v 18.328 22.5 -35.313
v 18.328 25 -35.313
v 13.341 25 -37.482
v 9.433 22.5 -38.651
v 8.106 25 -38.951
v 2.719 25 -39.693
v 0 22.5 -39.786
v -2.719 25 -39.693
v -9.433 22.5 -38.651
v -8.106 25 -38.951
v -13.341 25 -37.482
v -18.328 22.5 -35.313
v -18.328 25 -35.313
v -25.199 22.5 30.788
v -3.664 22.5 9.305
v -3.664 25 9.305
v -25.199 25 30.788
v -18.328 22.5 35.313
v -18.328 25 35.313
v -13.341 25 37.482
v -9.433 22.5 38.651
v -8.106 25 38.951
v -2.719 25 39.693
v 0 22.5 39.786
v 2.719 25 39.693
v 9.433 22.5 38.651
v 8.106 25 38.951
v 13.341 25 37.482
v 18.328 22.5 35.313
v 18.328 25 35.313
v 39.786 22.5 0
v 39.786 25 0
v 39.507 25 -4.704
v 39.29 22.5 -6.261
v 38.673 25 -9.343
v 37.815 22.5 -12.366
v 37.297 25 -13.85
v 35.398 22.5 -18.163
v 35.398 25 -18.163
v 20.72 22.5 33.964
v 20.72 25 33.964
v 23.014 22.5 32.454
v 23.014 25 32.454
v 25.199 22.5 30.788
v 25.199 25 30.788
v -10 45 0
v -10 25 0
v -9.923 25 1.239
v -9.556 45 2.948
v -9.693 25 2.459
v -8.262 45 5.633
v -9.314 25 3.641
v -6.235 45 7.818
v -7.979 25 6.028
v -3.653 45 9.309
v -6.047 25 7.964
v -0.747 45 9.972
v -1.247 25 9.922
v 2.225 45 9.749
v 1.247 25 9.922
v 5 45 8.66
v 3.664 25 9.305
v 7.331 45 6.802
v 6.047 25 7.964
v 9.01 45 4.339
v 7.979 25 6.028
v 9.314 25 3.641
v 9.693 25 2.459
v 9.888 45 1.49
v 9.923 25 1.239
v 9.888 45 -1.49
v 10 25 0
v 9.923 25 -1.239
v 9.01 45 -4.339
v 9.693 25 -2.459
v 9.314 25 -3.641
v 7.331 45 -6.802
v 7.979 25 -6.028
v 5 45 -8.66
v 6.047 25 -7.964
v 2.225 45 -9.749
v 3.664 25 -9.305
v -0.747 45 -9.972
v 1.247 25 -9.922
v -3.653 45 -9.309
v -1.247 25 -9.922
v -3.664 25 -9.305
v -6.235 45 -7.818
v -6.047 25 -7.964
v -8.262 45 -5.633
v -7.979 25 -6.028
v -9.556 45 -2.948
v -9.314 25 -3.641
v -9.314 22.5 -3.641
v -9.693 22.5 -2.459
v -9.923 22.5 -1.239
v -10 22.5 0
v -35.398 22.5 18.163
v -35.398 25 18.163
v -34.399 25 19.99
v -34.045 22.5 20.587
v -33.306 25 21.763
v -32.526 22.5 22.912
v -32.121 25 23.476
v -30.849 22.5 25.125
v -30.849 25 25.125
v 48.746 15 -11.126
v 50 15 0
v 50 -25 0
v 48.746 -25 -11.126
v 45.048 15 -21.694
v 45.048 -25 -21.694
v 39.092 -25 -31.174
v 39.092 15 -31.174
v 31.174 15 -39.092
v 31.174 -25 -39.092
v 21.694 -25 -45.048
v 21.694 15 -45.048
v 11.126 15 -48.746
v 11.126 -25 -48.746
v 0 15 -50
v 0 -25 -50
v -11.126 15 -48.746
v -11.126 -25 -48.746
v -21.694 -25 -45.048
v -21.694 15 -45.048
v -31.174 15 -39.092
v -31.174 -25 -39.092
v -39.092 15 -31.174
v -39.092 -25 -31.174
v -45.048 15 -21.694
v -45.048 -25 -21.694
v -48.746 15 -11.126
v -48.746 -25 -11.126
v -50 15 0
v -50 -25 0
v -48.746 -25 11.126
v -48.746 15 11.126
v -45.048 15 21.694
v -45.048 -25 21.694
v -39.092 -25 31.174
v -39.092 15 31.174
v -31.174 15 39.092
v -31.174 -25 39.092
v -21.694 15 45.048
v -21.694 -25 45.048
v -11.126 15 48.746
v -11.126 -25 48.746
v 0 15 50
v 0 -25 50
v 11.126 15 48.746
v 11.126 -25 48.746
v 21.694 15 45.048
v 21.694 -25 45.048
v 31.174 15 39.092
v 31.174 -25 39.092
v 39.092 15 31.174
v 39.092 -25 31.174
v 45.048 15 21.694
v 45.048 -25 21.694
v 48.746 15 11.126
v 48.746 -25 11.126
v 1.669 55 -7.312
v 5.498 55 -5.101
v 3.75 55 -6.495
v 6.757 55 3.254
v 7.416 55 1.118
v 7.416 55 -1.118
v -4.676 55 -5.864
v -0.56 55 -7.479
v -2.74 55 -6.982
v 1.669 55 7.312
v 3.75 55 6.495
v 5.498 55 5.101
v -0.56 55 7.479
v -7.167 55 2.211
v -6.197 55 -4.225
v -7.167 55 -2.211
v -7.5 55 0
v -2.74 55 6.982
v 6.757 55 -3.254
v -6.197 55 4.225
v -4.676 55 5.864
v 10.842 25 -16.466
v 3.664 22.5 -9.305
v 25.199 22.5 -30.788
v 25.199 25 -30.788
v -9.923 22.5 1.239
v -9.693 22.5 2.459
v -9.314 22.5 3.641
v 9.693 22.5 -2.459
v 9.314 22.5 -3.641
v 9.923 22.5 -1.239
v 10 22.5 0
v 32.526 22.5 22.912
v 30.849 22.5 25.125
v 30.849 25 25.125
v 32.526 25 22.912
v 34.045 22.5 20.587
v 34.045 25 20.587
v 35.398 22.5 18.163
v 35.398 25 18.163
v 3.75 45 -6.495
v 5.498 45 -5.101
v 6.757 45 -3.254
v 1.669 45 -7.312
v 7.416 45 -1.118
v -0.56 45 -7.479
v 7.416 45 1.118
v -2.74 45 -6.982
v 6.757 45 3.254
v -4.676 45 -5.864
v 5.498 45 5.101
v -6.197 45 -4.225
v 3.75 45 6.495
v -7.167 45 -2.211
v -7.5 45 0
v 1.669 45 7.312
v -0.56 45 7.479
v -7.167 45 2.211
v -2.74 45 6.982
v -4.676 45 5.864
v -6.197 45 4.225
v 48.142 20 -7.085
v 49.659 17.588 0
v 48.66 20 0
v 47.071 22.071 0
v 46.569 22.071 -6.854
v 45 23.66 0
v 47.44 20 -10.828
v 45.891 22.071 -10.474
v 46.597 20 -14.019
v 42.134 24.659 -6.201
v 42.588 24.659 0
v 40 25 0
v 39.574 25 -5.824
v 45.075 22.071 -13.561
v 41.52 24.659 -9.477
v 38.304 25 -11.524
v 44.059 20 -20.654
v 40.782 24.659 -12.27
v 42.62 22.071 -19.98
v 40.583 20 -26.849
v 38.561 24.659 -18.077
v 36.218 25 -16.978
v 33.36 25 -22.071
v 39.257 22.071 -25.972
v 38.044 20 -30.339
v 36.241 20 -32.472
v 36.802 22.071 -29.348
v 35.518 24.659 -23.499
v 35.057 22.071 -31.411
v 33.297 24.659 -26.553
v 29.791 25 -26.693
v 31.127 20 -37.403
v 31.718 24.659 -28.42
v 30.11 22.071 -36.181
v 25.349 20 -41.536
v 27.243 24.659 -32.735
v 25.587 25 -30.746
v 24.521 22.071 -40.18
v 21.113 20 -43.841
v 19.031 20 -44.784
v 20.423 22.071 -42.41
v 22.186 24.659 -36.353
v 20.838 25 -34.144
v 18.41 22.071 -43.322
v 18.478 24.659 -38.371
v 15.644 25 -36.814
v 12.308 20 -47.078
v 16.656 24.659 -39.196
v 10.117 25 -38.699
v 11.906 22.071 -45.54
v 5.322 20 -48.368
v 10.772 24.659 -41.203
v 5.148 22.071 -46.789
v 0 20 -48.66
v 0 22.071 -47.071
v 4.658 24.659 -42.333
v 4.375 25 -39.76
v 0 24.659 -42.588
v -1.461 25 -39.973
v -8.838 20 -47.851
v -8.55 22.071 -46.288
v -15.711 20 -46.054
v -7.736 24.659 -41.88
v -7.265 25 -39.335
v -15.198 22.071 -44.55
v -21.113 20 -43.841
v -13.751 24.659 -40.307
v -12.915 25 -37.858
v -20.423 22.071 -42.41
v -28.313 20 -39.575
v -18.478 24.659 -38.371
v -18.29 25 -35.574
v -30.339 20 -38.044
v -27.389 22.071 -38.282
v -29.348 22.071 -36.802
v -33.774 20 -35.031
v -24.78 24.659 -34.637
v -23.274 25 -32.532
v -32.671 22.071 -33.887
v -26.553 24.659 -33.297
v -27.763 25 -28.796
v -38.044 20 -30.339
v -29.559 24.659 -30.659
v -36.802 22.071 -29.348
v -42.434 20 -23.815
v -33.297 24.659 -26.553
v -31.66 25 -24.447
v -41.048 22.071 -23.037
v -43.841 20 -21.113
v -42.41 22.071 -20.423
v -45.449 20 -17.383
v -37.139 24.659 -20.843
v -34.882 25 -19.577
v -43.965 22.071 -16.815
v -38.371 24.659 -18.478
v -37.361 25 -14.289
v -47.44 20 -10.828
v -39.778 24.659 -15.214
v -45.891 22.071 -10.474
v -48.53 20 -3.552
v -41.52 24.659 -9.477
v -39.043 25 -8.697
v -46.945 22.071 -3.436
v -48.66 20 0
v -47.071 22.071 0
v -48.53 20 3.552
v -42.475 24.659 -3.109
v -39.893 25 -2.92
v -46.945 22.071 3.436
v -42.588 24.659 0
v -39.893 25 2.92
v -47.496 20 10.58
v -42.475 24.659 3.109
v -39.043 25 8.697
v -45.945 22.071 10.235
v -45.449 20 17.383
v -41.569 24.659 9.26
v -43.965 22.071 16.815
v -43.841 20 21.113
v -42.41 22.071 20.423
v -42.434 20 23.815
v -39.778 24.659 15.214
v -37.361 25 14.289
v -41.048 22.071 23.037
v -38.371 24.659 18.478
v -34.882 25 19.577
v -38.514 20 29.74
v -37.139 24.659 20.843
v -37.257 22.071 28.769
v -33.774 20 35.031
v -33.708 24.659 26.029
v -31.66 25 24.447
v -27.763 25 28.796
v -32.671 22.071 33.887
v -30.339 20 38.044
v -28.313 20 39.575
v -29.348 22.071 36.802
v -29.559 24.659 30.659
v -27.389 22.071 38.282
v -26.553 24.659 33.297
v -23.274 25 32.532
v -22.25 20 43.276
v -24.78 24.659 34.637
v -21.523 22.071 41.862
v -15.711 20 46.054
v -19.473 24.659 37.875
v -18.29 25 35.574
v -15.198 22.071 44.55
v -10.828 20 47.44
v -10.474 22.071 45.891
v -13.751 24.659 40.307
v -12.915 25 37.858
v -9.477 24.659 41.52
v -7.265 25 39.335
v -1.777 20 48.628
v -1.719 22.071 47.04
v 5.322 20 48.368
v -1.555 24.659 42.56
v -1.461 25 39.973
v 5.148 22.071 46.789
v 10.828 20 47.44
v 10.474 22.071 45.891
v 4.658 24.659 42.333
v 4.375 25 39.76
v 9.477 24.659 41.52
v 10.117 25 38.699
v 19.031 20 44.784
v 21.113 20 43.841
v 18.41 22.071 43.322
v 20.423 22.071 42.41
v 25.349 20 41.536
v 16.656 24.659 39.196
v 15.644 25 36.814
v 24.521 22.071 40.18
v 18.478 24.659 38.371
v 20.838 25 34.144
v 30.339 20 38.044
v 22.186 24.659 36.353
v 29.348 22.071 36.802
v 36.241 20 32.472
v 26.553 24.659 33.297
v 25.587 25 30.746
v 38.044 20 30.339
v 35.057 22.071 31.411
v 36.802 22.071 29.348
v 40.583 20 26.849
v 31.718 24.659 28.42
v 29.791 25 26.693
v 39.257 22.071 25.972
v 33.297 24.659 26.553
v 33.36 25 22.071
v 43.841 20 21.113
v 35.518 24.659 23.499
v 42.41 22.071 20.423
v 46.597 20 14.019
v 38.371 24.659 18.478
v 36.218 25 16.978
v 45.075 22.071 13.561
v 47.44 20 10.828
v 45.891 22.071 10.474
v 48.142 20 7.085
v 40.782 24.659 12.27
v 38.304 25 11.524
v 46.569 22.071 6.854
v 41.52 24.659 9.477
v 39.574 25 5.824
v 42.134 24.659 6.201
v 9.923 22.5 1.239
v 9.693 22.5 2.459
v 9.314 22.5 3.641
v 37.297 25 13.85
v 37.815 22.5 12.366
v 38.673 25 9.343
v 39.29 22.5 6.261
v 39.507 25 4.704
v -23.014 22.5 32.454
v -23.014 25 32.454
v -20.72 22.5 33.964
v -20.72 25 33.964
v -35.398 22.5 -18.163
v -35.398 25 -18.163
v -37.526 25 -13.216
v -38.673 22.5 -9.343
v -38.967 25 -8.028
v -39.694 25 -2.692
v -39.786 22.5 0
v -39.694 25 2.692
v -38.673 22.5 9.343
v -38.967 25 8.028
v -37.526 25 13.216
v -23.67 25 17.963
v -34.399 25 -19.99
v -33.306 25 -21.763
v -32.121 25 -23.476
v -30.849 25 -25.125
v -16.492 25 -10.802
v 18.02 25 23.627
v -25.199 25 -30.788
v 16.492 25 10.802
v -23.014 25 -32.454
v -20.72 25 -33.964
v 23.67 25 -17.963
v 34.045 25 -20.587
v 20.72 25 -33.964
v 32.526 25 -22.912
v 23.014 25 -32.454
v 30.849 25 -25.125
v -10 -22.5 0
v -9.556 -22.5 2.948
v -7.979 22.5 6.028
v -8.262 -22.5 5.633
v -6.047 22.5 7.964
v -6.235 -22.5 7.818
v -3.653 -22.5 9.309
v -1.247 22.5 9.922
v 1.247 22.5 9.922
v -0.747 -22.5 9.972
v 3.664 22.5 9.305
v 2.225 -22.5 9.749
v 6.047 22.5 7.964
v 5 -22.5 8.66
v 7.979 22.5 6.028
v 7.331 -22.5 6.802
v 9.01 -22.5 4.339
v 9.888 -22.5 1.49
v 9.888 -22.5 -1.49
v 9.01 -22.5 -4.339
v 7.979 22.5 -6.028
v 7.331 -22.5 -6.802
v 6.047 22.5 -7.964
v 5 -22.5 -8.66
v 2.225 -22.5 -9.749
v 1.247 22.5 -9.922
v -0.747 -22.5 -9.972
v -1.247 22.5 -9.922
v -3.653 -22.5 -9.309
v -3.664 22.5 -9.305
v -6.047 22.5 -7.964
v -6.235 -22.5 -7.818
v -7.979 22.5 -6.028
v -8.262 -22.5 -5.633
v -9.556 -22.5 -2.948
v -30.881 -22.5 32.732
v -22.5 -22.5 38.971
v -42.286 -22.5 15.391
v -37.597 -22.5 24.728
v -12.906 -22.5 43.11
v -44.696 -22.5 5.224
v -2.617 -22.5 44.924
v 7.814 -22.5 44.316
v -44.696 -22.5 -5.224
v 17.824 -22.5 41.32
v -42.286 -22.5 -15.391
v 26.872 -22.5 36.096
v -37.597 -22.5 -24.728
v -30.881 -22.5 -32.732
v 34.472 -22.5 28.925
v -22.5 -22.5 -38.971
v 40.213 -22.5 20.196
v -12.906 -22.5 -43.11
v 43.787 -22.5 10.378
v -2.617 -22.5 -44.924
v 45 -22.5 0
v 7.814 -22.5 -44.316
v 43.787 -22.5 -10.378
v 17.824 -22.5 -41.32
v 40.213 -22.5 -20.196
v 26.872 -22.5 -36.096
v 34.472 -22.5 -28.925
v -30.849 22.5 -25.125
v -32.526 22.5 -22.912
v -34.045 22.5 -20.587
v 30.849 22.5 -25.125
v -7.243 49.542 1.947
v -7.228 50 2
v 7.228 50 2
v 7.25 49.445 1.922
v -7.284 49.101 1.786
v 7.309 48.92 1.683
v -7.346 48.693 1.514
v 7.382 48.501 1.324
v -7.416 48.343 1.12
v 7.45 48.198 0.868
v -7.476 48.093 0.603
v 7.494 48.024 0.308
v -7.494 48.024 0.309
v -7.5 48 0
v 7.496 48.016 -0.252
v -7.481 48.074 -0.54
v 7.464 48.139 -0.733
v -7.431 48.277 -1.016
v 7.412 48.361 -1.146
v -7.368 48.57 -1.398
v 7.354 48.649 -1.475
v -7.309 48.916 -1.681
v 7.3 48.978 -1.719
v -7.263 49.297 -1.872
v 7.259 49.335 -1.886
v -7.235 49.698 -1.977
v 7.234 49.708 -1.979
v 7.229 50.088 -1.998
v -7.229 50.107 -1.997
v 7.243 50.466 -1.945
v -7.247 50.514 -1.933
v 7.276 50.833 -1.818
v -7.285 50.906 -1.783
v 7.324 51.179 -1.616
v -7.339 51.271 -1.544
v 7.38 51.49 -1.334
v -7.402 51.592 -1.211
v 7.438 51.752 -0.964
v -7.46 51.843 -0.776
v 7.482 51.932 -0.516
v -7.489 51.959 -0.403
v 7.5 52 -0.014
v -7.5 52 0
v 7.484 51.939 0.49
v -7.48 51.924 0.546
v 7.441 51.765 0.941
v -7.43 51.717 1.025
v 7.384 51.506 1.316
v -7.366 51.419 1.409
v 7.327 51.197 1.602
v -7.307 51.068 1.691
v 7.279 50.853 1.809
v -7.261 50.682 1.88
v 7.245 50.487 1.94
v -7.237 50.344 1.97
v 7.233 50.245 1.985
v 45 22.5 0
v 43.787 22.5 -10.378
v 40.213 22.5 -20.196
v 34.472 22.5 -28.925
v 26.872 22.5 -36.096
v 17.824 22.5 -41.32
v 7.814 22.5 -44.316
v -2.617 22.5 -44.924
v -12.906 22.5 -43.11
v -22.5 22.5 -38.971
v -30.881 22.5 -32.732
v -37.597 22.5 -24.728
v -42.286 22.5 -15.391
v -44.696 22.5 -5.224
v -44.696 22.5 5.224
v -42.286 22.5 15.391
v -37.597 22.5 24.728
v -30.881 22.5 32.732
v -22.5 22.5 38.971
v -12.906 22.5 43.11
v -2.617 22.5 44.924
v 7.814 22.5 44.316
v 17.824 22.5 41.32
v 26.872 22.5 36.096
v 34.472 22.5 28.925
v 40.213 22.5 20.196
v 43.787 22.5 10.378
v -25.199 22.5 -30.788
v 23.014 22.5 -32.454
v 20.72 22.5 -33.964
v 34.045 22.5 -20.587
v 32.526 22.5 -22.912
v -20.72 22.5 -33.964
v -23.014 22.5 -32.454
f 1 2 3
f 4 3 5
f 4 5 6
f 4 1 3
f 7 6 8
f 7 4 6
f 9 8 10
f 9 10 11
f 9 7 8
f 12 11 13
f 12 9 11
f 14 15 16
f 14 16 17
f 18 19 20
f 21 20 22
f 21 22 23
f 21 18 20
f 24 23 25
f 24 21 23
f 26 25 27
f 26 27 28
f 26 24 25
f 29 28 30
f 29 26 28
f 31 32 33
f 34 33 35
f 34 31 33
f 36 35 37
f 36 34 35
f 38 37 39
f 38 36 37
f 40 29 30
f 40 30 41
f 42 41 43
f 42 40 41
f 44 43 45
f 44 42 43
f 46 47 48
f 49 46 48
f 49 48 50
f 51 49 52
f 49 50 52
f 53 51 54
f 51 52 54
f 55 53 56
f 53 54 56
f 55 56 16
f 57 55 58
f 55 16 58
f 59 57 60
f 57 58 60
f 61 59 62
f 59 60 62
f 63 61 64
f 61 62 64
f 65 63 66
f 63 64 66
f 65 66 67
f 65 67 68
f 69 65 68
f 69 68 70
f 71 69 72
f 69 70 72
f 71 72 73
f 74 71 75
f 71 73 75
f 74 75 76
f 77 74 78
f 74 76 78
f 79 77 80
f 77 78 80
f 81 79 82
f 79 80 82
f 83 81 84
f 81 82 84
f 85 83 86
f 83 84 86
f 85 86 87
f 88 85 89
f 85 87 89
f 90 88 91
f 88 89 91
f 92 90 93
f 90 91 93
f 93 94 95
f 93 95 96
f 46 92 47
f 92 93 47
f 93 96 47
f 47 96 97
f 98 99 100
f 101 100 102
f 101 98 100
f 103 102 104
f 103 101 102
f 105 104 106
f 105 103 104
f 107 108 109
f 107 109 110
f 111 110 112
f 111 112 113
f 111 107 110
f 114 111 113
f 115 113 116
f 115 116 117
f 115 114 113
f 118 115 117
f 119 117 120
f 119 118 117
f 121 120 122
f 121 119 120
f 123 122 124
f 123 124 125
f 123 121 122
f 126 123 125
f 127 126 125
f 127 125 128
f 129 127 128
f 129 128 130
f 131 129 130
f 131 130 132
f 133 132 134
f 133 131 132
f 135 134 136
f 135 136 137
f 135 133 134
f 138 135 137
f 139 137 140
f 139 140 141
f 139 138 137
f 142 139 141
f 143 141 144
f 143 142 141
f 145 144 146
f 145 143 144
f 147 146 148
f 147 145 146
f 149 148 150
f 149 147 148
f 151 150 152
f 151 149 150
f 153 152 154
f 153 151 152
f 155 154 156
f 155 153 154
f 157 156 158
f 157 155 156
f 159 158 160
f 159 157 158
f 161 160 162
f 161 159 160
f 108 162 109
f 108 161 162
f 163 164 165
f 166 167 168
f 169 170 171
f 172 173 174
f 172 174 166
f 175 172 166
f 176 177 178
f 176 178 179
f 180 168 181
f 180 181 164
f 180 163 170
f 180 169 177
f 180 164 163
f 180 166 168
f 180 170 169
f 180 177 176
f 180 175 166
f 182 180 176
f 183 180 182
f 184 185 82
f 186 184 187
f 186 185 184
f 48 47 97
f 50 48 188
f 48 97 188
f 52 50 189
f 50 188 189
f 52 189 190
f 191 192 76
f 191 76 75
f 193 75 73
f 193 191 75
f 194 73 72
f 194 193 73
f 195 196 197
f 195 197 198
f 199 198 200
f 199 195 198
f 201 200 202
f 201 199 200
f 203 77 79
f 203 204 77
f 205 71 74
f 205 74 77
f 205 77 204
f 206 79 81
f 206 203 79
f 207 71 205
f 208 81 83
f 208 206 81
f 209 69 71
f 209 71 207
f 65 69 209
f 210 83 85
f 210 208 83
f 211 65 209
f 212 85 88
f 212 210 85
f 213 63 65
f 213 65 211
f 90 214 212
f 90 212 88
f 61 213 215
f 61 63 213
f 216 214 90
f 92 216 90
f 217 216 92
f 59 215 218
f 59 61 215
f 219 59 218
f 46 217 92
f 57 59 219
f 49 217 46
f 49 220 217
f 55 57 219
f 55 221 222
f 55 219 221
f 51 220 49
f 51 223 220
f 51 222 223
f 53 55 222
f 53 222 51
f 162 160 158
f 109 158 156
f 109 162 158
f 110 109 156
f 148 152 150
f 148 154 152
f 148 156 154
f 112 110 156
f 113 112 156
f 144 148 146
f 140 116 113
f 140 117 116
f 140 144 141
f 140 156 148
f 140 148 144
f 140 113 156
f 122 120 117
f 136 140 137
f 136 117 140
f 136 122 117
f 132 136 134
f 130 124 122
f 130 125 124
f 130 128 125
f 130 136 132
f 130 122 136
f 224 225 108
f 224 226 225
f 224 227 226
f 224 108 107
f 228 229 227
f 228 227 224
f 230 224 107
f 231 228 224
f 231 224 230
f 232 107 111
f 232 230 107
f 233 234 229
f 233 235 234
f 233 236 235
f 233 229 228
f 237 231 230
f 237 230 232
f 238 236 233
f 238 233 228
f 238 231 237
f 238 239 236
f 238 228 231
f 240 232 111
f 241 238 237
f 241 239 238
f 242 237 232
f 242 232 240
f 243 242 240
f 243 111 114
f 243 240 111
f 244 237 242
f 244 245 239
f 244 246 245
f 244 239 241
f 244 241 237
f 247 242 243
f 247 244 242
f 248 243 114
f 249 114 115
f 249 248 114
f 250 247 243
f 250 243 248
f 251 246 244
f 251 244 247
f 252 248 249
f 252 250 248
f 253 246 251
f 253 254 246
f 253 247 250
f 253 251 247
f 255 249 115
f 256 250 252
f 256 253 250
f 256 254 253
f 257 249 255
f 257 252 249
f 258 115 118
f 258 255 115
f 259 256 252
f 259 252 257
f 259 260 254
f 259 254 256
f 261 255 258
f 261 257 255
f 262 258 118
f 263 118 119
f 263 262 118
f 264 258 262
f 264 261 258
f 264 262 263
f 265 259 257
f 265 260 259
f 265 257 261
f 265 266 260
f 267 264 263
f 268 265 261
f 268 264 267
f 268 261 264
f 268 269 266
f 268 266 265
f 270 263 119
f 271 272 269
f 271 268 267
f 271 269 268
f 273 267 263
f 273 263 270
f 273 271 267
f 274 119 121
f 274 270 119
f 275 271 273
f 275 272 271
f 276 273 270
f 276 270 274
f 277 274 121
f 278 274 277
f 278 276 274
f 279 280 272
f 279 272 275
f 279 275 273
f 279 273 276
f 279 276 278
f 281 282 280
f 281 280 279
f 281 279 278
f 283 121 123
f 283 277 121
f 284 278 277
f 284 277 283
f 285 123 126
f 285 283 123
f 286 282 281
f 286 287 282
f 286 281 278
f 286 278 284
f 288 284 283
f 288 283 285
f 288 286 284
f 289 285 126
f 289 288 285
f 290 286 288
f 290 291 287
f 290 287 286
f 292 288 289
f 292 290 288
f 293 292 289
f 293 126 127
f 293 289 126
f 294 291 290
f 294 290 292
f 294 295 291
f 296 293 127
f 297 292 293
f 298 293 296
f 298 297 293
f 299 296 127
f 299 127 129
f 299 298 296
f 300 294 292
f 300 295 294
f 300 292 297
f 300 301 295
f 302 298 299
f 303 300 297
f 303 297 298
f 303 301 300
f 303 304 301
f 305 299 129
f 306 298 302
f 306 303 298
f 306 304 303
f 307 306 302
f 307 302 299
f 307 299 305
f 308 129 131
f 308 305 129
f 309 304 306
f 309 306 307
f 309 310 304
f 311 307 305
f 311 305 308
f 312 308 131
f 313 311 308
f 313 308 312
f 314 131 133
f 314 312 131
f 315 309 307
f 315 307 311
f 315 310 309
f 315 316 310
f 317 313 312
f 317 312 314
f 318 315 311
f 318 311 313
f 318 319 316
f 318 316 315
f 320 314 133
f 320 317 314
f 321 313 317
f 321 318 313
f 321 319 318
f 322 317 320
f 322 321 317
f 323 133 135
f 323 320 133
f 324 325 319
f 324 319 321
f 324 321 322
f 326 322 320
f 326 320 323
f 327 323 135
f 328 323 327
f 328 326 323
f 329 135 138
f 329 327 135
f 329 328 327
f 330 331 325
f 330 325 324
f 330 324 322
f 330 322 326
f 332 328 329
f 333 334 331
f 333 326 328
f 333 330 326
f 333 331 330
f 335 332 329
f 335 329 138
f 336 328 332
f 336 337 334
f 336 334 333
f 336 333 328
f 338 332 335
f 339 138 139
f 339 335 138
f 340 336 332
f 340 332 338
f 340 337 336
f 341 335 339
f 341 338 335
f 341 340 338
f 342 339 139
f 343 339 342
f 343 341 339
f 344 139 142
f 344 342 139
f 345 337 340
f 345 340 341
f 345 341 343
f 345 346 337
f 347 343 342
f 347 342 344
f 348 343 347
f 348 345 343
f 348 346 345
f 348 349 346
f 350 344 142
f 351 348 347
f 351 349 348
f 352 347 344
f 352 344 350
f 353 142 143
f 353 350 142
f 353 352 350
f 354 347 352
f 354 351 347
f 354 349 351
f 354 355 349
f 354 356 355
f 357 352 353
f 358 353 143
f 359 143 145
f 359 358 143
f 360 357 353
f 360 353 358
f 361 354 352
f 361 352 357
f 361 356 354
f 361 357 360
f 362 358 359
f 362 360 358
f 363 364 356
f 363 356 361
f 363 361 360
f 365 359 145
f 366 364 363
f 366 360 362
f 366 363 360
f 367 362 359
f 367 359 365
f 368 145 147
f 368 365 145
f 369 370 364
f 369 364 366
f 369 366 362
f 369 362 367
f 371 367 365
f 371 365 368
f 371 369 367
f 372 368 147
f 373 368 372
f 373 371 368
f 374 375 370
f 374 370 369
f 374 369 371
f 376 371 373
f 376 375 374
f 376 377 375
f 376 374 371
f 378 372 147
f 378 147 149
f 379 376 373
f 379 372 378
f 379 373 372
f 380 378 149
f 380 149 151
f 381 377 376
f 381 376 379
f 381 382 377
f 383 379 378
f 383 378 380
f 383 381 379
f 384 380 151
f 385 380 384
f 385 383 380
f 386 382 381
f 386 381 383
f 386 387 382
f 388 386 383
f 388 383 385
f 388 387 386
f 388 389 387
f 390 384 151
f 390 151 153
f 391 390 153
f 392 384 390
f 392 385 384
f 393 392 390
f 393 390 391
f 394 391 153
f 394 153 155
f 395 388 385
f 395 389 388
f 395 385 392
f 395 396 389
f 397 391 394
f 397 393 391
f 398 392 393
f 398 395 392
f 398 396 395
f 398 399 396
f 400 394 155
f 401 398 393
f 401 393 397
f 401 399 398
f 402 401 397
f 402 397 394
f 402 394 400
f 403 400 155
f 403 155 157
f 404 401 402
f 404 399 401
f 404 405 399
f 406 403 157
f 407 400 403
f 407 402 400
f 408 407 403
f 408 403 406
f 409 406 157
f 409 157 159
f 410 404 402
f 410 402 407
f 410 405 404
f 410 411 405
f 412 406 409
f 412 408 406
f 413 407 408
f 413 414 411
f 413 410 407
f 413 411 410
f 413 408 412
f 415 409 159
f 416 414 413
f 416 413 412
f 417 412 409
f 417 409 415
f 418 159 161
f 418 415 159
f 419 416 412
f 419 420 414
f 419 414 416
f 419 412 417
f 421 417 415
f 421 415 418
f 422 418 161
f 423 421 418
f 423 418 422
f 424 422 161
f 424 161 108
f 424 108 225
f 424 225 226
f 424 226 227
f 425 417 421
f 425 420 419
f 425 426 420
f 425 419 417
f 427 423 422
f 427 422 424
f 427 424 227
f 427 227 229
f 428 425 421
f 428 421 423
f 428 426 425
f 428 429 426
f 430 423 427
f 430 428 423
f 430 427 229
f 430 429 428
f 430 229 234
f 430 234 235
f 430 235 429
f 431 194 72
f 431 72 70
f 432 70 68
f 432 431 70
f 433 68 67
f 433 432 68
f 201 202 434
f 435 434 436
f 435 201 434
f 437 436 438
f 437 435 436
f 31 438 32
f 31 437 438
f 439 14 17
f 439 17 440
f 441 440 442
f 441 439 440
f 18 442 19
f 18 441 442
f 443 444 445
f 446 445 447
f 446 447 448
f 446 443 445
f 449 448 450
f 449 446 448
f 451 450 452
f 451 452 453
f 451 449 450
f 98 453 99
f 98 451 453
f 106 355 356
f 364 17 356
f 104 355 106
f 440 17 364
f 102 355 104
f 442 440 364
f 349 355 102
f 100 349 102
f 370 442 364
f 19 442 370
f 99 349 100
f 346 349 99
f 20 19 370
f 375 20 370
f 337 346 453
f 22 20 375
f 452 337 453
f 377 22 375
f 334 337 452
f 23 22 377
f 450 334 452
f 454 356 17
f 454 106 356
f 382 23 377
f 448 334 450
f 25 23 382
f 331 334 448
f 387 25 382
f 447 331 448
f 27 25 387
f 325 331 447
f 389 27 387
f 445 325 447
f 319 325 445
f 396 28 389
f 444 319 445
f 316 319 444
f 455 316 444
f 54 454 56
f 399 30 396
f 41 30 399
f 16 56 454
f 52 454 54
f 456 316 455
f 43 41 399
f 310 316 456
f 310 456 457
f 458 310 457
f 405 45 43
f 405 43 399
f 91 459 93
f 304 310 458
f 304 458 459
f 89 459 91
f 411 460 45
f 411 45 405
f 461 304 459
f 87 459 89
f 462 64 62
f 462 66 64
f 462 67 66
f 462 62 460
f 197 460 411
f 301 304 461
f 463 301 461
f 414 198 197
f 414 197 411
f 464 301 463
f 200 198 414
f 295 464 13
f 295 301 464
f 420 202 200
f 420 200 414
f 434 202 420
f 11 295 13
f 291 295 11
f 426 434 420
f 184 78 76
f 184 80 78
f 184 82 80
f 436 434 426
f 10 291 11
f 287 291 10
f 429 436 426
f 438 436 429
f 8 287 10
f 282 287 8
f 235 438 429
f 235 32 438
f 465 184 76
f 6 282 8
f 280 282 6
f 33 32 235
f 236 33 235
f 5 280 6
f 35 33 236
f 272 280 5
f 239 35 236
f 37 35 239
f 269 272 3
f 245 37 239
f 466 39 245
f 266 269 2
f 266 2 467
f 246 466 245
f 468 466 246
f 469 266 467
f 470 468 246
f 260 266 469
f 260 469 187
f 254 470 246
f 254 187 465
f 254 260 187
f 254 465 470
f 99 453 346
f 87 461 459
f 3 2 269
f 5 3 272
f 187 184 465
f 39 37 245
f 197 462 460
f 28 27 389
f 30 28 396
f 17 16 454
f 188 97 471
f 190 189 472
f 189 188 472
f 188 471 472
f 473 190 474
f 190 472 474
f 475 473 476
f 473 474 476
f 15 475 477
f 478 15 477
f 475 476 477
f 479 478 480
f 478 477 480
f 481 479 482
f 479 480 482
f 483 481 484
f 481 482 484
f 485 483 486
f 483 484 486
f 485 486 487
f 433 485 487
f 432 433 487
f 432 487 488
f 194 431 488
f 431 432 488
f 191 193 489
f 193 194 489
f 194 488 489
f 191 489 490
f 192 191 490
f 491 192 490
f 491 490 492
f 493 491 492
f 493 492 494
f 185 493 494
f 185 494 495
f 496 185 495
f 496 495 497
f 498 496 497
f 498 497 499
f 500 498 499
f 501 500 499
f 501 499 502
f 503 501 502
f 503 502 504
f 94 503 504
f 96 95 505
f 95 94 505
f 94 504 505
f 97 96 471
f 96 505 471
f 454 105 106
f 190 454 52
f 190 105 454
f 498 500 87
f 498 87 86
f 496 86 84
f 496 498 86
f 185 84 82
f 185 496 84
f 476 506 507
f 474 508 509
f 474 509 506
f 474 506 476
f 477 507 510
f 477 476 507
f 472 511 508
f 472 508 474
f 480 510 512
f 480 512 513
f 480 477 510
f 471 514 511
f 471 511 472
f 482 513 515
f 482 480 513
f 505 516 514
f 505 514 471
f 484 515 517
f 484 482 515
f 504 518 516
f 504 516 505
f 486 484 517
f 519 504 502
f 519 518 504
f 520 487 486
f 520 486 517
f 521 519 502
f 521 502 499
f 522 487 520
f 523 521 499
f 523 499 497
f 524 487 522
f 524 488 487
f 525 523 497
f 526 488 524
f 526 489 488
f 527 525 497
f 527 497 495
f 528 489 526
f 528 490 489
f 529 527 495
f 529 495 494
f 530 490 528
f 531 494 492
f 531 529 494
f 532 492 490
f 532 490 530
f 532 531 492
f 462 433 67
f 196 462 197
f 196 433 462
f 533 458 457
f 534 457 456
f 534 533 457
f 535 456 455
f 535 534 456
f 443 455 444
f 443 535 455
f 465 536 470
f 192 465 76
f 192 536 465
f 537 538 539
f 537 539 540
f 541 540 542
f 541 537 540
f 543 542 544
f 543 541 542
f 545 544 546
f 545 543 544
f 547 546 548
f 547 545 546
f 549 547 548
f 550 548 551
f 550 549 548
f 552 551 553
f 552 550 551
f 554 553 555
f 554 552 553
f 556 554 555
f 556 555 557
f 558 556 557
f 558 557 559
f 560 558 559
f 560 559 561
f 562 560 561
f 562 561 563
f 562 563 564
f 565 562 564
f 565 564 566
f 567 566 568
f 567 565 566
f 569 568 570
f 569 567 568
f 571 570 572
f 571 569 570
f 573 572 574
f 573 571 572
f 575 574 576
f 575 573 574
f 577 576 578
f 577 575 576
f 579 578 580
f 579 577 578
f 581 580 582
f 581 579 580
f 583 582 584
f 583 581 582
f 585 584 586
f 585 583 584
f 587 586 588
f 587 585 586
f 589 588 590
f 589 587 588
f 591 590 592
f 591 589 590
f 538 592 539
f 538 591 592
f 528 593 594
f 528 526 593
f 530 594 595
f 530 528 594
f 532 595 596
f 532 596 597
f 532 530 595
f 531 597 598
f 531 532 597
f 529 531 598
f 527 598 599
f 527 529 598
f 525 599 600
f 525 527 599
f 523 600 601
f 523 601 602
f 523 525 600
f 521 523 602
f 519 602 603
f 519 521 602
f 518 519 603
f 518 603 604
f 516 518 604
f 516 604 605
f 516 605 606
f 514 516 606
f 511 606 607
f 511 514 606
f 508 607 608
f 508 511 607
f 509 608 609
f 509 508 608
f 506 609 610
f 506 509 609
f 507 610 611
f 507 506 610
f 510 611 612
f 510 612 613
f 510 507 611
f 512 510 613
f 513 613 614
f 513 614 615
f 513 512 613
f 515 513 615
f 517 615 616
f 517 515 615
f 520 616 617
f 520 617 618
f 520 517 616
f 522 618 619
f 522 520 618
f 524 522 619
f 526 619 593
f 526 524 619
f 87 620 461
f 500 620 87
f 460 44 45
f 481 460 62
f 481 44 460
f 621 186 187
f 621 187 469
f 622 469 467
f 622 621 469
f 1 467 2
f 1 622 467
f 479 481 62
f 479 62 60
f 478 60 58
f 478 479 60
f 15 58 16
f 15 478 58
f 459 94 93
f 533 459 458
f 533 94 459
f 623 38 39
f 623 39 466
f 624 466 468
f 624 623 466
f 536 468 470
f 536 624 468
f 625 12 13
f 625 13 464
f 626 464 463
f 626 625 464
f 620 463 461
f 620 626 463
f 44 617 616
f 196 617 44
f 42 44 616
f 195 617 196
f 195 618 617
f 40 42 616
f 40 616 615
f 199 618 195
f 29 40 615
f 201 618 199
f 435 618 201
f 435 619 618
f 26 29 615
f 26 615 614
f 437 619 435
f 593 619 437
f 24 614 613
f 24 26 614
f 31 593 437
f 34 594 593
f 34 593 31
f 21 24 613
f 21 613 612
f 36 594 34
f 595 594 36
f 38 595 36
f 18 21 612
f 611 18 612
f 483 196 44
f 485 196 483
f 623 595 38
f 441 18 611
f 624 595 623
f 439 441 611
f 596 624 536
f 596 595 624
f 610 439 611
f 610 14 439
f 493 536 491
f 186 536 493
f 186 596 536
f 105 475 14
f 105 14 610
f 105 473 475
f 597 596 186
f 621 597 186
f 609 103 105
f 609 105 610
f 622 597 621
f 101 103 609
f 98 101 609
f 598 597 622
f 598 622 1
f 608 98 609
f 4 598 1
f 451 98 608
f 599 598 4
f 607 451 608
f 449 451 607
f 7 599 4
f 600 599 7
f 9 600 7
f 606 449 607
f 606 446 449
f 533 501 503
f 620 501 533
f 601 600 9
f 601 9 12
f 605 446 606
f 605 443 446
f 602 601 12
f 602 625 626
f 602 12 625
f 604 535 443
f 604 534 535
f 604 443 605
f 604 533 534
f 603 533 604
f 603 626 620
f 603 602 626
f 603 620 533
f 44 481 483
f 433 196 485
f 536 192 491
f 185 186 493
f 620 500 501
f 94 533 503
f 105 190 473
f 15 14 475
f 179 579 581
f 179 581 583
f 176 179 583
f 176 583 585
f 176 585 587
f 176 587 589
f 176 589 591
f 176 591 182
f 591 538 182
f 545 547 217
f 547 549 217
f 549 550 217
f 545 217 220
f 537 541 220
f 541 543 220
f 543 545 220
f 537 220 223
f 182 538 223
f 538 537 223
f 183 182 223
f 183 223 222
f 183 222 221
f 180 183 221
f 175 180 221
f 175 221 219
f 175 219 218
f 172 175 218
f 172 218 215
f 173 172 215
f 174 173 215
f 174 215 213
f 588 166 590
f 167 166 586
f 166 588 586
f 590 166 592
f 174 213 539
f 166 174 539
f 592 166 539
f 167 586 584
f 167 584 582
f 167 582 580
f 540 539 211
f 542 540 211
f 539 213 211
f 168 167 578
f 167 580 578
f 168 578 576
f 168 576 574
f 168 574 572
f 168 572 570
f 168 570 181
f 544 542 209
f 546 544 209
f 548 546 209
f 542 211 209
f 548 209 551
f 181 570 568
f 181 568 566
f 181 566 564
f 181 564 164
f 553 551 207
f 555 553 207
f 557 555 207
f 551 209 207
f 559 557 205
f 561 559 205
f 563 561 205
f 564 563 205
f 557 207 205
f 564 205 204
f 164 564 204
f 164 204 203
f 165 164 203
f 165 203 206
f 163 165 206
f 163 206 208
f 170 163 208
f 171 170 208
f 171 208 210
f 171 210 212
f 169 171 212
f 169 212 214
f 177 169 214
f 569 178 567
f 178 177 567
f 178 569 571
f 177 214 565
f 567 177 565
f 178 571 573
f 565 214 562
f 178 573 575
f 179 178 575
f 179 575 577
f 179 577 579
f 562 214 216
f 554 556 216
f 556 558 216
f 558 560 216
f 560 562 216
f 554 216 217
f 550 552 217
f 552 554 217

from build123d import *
from build123d.topology import SkipClean

# Parameters (mm, degrees)
SKETCH2_R               = 10
BOSS_EXTRUDE1_DEPTH     = 30
CUT_EXTRUDE1_START      = -10
SKETCH3_R               = 10
SKETCH3_R_2             = 7.5
CUT_EXTRUDE1_DEPTH      = 10
CUT_EXTRUDE3_DEPTH      = 10
CUT_EXTRUDE3_DEPTH_BACK = 10
SKETCH5_R               = 2
CUT_EXTRUDE4_START      = -10
CUT_EXTRUDE4_DEPTH      = 10
FILLET2_R               = 10
BOSS_EXTRUDE2_START     = -67.5
SKETCH7_R               = 10
BOSS_EXTRUDE2_DEPTH     = 67.5


with BuildPart() as part:
    # Sketch1 → Revolve1 (revolve)
    with BuildSketch(Plane.XY):
        Polygon((50, 25), (0, 25), (0, 22.5), (45, 22.5), (45, -22.5), (0, -22.5), (0, -25), (50, -25), align=None)
    revolve(axis=Axis((0, -25, 0), (0, 1, 0)))

    # Sketch2 → Boss-Extrude1 (add)
    with BuildSketch(Plane(origin=(0, 25, 0), x_dir=(1, 0, 0), z_dir=(0, 1, 0))):
        with Locations(Location((0, 0, 0), (0, 0, 180))):
            Circle(SKETCH2_R)
    extrude(amount=BOSS_EXTRUDE1_DEPTH)

    # Sketch3 → Cut-Extrude1 (cut)
    with BuildSketch(Plane(origin=(0, 55, 0), x_dir=(1, 0, 0), z_dir=(0, 1, 0)).offset(CUT_EXTRUDE1_START)):
        with Locations(Location((0, 0, 0), (0, 0, 180))):
            Circle(SKETCH3_R)
        with Locations(Location((0, 0, 0), (0, 0, 180))):
            Circle(SKETCH3_R_2, mode=Mode.SUBTRACT)
    extrude(amount=CUT_EXTRUDE1_DEPTH, mode=Mode.SUBTRACT)

    # Sketch5 → Cut-Extrude3 (cut, two sides: drawn at the far end of the back side and taken through both)
    with BuildSketch(Plane(origin=(0, 0, 0), x_dir=(0, 0, -1), z_dir=(1, 0, 0)).offset(-CUT_EXTRUDE3_DEPTH_BACK)):
        with Locations(Location((0, 50, 0), (0, 0, 180))):
            Circle(SKETCH5_R)
    extrude(amount=CUT_EXTRUDE3_DEPTH + CUT_EXTRUDE3_DEPTH_BACK, mode=Mode.SUBTRACT)

    # Sketch6 → Cut-Extrude4 (cut)
    with SkipClean():  # the faces are left unmerged after this step: merging them gives an invalid solid
        with BuildSketch(Plane(origin=(0, 25, 0), x_dir=(1, 0, 0), z_dir=(0, 1, 0)).offset(CUT_EXTRUDE4_START)):
            with BuildLine():
                ThreePointArc((18.327704801, 35.312767957), (0, 39.785629869), (-18.327704801, 35.312767957))
                Line((-18.327704801, 35.312767957), (18.327704801, 35.312767957))
            make_face()
            with BuildLine():
                Line((-25.198784951, 30.788270186), (-3.663513289, 9.304766004))
                ThreePointArc((-3.663513289, 9.304766004), (0, 10), (3.663513289, 9.304766004))
                Line((3.663513289, 9.304766004), (25.198784951, 30.788270186))
                ThreePointArc((25.198784951, 30.788270186), (21.880507251, 33.228598323), (18.327704801, 35.312767957))
                Line((18.327704801, 35.312767957), (-18.327704801, 35.312767957))
                ThreePointArc((-18.327704801, 35.312767957), (-21.880507251, 33.228598323), (-25.198784951, 30.788270186))
            make_face()
            with BuildLine():
                Line((30.848827824, 25.124612751), (9.313556162, 3.641108569))
                ThreePointArc((9.313556162, 3.641108569), (9.826890699, 1.852624946), (10, 0))
                ThreePointArc((10, 0), (9.826890699, -1.852624946), (9.313556162, -3.641108569))
                Line((9.313556162, -3.641108569), (30.848827824, -25.124612751))
                ThreePointArc((30.848827824, -25.124612751), (33.305743158, -21.762900008), (35.397858964, -18.162817094))
                Line((35.397858964, -18.162817094), (35.397858964, 18.162817094))
                ThreePointArc((35.397858964, 18.162817094), (33.305743158, 21.762900008), (30.848827824, 25.124612751))
            make_face()
            with BuildLine():
                ThreePointArc((39.785629869, 0), (38.673133173, 9.342650297), (35.397858964, 18.162817094))
                Line((35.397858964, 18.162817094), (35.397858964, -18.162817094))
                ThreePointArc((35.397858964, -18.162817094), (38.673133173, -9.342650297), (39.785629869, 0))
            make_face()
            with BuildLine():
                ThreePointArc((3.663513289, -9.304766004), (0, -10), (-3.663513289, -9.304766004))
                Line((-3.663513289, -9.304766004), (-25.198784951, -30.788270186))
                ThreePointArc((-25.198784951, -30.788270186), (-21.880507251, -33.228598323), (-18.327704801, -35.312767957))
                Line((-18.327704801, -35.312767957), (18.327704801, -35.312767957))
                ThreePointArc((18.327704801, -35.312767957), (21.880507251, -33.228598323), (25.198784951, -30.788270186))
                Line((25.198784951, -30.788270186), (3.663513289, -9.304766004))
            make_face()
            with BuildLine():
                Line((18.327704801, -35.312767957), (-18.327704801, -35.312767957))
                ThreePointArc((-18.327704801, -35.312767957), (0, -39.785629869), (18.327704801, -35.312767957))
            make_face()
            with BuildLine():
                ThreePointArc((-9.313556162, -3.641108569), (-10, 0), (-9.313556162, 3.641108569))
                Line((-9.313556162, 3.641108569), (-30.848827824, 25.124612751))
                ThreePointArc((-30.848827824, 25.124612751), (-33.305743158, 21.762900008), (-35.397858964, 18.162817094))
                Line((-35.397858964, 18.162817094), (-35.397858964, -18.162817094))
                ThreePointArc((-35.397858964, -18.162817094), (-33.305743158, -21.762900008), (-30.848827824, -25.124612751))
                Line((-30.848827824, -25.124612751), (-9.313556162, -3.641108569))
            make_face()
            with BuildLine():
                Line((-35.397858964, -18.162817094), (-35.397858964, 18.162817094))
                ThreePointArc((-35.397858964, 18.162817094), (-39.785629869, 0), (-35.397858964, -18.162817094))
            make_face()
        extrude(amount=CUT_EXTRUDE4_DEPTH, mode=Mode.SUBTRACT)

    # Fillet2
    fillet2_edges = [part.edges().sort_by_distance(p)[0] for p in [
        (-50, 25, 0),
    ]]
    fillet(fillet2_edges, radius=FILLET2_R)

    # Sketch7 → Boss-Extrude2 (add)
    with SkipClean():  # the faces are left unmerged after this step: merging them gives an invalid solid
        with BuildSketch(Plane(origin=(0, 45, 0), x_dir=(1, 0, 0), z_dir=(0, 1, 0)).offset(BOSS_EXTRUDE2_START)):
            with Locations(Location((0, 0, 0), (0, 0, 180))):
                Circle(SKETCH7_R)
        extrude(amount=BOSS_EXTRUDE2_DEPTH)


solid = part.part
